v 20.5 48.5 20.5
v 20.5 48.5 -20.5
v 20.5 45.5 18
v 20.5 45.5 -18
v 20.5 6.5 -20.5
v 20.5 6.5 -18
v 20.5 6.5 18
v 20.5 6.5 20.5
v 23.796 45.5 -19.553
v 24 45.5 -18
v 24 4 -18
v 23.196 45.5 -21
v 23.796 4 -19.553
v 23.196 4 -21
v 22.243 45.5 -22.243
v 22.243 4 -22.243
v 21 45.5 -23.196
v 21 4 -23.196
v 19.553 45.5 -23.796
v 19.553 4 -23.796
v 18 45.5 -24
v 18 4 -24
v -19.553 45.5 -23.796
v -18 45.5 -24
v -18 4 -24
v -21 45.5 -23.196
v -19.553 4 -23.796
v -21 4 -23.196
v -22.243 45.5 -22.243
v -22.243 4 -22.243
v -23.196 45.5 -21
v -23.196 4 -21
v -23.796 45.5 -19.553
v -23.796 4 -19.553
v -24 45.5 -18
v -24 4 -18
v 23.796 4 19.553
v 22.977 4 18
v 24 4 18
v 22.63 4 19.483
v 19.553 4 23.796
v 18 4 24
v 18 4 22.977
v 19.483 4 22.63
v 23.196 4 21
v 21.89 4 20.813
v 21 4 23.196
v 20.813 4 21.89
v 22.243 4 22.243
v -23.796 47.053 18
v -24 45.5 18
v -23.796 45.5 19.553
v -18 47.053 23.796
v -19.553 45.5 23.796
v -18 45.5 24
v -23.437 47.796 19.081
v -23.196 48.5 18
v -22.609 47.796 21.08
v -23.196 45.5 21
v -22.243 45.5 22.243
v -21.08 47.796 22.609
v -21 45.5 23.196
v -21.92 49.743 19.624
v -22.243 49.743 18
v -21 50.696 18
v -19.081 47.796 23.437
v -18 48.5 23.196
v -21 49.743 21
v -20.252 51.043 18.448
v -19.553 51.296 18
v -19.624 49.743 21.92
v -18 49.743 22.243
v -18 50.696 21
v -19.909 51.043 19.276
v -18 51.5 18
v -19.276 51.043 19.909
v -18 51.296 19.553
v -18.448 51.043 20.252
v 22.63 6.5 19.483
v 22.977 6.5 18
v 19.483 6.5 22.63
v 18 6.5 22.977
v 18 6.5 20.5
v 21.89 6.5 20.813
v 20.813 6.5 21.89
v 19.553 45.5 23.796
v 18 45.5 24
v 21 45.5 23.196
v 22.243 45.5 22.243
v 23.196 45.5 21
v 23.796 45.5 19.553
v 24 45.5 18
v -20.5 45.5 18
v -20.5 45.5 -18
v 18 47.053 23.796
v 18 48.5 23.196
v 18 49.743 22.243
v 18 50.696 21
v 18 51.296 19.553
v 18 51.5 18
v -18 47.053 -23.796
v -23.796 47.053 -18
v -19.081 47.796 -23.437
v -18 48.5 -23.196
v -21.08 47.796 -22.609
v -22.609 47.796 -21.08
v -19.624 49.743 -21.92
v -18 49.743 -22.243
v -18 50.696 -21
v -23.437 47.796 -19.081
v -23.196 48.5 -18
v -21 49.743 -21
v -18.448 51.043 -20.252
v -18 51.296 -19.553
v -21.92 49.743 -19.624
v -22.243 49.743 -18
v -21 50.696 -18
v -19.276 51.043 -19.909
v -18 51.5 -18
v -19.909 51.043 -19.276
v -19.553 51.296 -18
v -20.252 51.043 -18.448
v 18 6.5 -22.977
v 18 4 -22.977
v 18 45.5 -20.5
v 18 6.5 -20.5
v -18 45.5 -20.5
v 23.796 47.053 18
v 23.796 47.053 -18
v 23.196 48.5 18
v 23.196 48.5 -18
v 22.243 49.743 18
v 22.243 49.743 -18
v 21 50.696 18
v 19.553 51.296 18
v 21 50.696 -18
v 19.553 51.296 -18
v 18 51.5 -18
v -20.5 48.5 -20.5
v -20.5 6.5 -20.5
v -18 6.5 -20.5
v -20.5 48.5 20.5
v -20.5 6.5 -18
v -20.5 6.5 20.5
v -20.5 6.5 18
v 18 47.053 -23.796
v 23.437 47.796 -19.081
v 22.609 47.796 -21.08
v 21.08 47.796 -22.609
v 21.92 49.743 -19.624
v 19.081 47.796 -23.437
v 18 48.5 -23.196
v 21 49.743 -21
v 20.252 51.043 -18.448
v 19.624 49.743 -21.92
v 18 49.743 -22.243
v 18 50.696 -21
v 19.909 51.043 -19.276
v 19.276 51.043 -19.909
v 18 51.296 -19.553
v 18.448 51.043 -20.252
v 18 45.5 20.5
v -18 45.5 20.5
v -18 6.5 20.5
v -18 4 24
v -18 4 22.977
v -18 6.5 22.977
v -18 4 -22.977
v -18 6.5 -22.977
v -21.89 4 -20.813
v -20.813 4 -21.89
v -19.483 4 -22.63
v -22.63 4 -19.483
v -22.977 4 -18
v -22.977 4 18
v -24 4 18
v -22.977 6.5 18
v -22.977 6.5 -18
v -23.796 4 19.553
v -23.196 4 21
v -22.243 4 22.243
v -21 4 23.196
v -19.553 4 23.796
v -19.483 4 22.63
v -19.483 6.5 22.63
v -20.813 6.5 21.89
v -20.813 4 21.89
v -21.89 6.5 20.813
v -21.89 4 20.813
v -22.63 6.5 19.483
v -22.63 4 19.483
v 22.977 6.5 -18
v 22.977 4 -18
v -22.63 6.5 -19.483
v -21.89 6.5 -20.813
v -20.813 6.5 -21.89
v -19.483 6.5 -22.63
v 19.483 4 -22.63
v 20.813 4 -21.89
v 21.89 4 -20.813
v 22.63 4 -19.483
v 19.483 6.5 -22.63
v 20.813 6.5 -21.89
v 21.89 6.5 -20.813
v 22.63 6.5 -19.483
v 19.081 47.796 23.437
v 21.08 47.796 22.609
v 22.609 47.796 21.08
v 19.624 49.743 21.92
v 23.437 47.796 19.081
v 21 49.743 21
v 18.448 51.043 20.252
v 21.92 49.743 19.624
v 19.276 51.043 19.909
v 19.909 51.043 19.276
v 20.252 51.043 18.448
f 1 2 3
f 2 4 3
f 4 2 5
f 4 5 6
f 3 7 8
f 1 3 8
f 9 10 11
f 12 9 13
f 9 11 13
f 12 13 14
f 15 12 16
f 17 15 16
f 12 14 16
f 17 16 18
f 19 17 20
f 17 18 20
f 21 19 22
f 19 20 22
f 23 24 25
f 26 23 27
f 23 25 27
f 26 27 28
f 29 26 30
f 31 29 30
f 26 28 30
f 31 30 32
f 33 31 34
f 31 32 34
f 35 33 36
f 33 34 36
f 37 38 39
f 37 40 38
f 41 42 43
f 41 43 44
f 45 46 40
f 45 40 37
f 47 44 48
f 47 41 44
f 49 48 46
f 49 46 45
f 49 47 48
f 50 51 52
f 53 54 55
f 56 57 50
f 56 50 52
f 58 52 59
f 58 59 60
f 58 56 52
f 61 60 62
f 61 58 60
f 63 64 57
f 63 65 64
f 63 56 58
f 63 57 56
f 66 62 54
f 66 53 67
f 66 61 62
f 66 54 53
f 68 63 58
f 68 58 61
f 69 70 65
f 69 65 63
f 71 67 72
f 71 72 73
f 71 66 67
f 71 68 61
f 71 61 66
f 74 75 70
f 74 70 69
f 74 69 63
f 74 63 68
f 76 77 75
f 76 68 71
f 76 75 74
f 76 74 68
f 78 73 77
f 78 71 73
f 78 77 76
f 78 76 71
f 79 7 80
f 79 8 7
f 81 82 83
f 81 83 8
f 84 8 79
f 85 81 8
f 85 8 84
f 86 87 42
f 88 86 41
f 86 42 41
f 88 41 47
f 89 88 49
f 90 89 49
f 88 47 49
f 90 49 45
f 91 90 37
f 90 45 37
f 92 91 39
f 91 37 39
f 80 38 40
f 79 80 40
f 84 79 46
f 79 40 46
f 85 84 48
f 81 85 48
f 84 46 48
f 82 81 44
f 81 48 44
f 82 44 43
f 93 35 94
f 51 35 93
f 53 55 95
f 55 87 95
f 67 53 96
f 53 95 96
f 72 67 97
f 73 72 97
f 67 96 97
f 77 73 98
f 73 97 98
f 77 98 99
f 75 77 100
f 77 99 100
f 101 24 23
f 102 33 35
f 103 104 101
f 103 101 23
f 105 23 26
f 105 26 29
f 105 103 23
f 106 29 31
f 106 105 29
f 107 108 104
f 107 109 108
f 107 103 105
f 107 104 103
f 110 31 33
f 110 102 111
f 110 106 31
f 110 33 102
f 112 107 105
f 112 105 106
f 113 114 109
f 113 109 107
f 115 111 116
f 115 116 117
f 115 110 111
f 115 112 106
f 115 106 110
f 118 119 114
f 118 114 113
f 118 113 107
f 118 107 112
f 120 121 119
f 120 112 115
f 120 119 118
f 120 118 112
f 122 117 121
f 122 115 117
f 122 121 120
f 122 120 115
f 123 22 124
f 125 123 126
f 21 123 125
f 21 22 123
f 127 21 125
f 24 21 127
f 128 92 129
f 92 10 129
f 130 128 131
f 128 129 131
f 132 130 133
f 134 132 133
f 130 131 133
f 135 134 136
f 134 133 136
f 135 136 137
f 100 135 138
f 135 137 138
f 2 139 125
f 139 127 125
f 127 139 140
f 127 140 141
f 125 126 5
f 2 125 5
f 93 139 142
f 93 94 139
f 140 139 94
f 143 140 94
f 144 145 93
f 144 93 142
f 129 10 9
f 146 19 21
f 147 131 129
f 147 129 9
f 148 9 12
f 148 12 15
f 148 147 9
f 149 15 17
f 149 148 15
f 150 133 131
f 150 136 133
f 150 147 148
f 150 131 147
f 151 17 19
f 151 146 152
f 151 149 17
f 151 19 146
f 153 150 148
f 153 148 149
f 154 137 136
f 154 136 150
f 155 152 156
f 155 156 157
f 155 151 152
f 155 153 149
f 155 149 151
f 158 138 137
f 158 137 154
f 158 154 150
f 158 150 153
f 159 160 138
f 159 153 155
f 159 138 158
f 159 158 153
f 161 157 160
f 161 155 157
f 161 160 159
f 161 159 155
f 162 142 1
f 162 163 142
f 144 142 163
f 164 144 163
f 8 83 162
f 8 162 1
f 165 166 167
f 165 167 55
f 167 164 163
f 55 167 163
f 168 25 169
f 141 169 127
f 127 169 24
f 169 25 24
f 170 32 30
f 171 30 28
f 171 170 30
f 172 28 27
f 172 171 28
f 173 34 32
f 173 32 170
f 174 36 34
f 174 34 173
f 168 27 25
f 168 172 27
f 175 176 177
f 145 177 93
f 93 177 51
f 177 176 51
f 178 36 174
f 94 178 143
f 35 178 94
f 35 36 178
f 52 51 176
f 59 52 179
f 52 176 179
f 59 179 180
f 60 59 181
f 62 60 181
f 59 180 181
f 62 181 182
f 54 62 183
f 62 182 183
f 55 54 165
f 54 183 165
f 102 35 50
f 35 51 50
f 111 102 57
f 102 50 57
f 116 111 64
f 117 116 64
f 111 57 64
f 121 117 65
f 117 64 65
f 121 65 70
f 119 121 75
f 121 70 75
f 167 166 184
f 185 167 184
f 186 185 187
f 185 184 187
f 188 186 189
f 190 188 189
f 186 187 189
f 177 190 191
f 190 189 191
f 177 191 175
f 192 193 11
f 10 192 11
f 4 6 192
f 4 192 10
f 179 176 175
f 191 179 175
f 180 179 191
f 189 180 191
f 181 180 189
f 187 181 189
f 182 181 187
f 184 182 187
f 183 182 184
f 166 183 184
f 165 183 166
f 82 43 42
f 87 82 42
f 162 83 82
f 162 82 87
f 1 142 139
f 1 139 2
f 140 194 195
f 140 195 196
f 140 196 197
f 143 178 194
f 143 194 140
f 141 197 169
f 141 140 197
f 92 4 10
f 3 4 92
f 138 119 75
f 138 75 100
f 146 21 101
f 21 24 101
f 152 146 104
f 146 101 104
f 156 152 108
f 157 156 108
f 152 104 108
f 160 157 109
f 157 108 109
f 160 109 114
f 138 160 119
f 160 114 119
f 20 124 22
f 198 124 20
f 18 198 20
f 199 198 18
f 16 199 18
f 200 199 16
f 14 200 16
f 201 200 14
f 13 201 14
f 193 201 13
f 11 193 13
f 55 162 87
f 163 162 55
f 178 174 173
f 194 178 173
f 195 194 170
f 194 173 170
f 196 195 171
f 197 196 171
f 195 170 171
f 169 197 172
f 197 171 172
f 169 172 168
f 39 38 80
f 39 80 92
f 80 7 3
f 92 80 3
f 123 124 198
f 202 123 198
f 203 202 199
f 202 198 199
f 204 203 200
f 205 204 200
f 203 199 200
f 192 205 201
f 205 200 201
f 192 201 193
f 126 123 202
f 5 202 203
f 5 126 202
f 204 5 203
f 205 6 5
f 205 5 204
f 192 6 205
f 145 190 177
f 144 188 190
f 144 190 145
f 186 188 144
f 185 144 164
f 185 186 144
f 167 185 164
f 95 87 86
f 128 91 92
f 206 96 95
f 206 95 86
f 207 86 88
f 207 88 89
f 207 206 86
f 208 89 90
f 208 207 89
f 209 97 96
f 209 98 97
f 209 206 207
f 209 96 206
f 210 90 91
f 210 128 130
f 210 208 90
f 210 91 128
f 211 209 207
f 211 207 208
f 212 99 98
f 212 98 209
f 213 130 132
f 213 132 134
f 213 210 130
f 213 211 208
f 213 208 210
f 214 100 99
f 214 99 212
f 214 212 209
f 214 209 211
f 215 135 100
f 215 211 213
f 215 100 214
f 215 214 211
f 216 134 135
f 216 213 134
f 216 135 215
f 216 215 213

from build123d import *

# Parameters (mm, degrees)
EXTRUDE_1_DEPTH     = 51.5
FILLET_2_R          = 6
SKETCH_2_W          = 41
SKETCH_2_H          = 41
CUT_EXTRUDE_1_DEPTH = 48.5
SKETCH_3_W          = 36
SKETCH_3_H          = 45.5
CUT_EXTRUDE_2_DEPTH = 54
SKETCH_4_W          = 36
SKETCH_4_H          = 45.5
CUT_EXTRUDE_3_DEPTH = 54
CUT_EXTRUDE_4_DEPTH = 6.5
CUT_EXTRUDE_5_DEPTH = 4


with BuildPart() as part:
    # 草图1 → 凸台-拉伸1 (new body)
    with BuildSketch(Plane(origin=(0, 0, 0), x_dir=(1, 0, 0), z_dir=(0, 1, 0))):
        with BuildLine():
            Line((-18, -24), (18, -24))
            ThreePointArc((18, -24), (22.242640687, -22.242640687), (24, -18))
            Line((24, -18), (24, 18))
            ThreePointArc((24, 18), (22.242640687, 22.242640687), (18, 24))
            Line((18, 24), (-18, 24))
            ThreePointArc((-18, 24), (-22.242640687, 22.242640687), (-24, 18))
            Line((-24, 18), (-24, -18))
            ThreePointArc((-24, -18), (-22.242640687, -22.242640687), (-18, -24))
        make_face()
    extrude(amount=EXTRUDE_1_DEPTH)

    # 圆角2
    fillet_2_edges = [part.edges().sort_by_distance(p)[0] for p in [
        (22.242640687, 51.5, -22.242640687),
        (24, 51.5, 0),
        (22.242640687, 51.5, 22.242640687),
        (0, 51.5, 24),
        (-22.242640687, 51.5, 22.242640687),
        (-24, 51.5, 0),
        (-22.242640687, 51.5, -22.242640687),
        (0, 51.5, -24),
    ]]
    fillet(fillet_2_edges, radius=FILLET_2_R)

    # 草图2 → 切除-拉伸1 (cut)
    with BuildSketch(Plane.XZ):
        Rectangle(SKETCH_2_W, SKETCH_2_H)
    extrude(amount=-CUT_EXTRUDE_1_DEPTH, mode=Mode.SUBTRACT)

    # 草图3 → 切除-拉伸2 (cut)
    with BuildSketch(Plane(origin=(0, 0, -24), x_dir=(-1, 0, 0), z_dir=(0, 0, -1))):
        with Locations((0, 22.75)):
            Rectangle(SKETCH_3_W, SKETCH_3_H)
    extrude(amount=-CUT_EXTRUDE_2_DEPTH, mode=Mode.SUBTRACT)

    # 草图4 → 切除-拉伸3 (cut)
    with BuildSketch(Plane.ZY.offset(24)):
        with Locations((0, 22.75)):
            Rectangle(SKETCH_4_W, SKETCH_4_H)
    extrude(amount=-CUT_EXTRUDE_3_DEPTH, mode=Mode.SUBTRACT)

    # 草图5 → 切除-拉伸4 (cut)
    with BuildSketch(Plane.XZ):
        with BuildLine():
            Line((-17.5, -23), (17.5, -23))
            ThreePointArc((17.5, -23), (21.389087297, -21.389087297), (23, -17.5))
            Line((23, -17.5), (23, 17.5))
            ThreePointArc((23, 17.5), (21.389087297, 21.389087297), (17.5, 23))
            Line((17.5, 23), (-17.5, 23))
            ThreePointArc((-17.5, 23), (-21.389087297, 21.389087297), (-23, 17.5))
            Line((-23, 17.5), (-23, -17.5))
            ThreePointArc((-23, -17.5), (-21.389087297, -21.389087297), (-17.5, -23))
        make_face()
    extrude(amount=-CUT_EXTRUDE_4_DEPTH, mode=Mode.SUBTRACT)

    # 草图8 → 切除-拉伸5 (cut)
    with BuildSketch(Plane.XZ):
        with BuildLine():
            Line((18, -22.977225575), (18, -24))
            ThreePointArc((18, -24), (22.242640687, -22.242640687), (24, -18))
            Line((24, -18), (22.977225575, -18))
            ThreePointArc((22.977225575, -18), (21.389087297, -21.389087297), (18, -22.977225575))
        make_face()
        with BuildLine():
            Line((22.977225575, 18), (24, 18))
            ThreePointArc((24, 18), (22.242640687, 22.242640687), (18, 24))
            Line((18, 24), (18, 22.977225575))
            ThreePointArc((18, 22.977225575), (21.389087297, 21.389087297), (22.977225575, 18))
        make_face()
        with BuildLine():
            Line((-18, 22.977225575), (-18, 24))
            ThreePointArc((-18, 24), (-22.242640687, 22.242640687), (-24, 18))
            Line((-24, 18), (-22.977225575, 18))
            ThreePointArc((-22.977225575, 18), (-21.389087297, 21.389087297), (-18, 22.977225575))
        make_face()
        with BuildLine():
            Line((-22.977225575, -18), (-24, -18))
            ThreePointArc((-24, -18), (-22.242640687, -22.242640687), (-18, -24))
            Line((-18, -24), (-18, -22.977225575))
            ThreePointArc((-18, -22.977225575), (-21.389087297, -21.389087297), (-22.977225575, -18))
        make_face()
    extrude(amount=-CUT_EXTRUDE_5_DEPTH, mode=Mode.SUBTRACT)


solid = part.part
